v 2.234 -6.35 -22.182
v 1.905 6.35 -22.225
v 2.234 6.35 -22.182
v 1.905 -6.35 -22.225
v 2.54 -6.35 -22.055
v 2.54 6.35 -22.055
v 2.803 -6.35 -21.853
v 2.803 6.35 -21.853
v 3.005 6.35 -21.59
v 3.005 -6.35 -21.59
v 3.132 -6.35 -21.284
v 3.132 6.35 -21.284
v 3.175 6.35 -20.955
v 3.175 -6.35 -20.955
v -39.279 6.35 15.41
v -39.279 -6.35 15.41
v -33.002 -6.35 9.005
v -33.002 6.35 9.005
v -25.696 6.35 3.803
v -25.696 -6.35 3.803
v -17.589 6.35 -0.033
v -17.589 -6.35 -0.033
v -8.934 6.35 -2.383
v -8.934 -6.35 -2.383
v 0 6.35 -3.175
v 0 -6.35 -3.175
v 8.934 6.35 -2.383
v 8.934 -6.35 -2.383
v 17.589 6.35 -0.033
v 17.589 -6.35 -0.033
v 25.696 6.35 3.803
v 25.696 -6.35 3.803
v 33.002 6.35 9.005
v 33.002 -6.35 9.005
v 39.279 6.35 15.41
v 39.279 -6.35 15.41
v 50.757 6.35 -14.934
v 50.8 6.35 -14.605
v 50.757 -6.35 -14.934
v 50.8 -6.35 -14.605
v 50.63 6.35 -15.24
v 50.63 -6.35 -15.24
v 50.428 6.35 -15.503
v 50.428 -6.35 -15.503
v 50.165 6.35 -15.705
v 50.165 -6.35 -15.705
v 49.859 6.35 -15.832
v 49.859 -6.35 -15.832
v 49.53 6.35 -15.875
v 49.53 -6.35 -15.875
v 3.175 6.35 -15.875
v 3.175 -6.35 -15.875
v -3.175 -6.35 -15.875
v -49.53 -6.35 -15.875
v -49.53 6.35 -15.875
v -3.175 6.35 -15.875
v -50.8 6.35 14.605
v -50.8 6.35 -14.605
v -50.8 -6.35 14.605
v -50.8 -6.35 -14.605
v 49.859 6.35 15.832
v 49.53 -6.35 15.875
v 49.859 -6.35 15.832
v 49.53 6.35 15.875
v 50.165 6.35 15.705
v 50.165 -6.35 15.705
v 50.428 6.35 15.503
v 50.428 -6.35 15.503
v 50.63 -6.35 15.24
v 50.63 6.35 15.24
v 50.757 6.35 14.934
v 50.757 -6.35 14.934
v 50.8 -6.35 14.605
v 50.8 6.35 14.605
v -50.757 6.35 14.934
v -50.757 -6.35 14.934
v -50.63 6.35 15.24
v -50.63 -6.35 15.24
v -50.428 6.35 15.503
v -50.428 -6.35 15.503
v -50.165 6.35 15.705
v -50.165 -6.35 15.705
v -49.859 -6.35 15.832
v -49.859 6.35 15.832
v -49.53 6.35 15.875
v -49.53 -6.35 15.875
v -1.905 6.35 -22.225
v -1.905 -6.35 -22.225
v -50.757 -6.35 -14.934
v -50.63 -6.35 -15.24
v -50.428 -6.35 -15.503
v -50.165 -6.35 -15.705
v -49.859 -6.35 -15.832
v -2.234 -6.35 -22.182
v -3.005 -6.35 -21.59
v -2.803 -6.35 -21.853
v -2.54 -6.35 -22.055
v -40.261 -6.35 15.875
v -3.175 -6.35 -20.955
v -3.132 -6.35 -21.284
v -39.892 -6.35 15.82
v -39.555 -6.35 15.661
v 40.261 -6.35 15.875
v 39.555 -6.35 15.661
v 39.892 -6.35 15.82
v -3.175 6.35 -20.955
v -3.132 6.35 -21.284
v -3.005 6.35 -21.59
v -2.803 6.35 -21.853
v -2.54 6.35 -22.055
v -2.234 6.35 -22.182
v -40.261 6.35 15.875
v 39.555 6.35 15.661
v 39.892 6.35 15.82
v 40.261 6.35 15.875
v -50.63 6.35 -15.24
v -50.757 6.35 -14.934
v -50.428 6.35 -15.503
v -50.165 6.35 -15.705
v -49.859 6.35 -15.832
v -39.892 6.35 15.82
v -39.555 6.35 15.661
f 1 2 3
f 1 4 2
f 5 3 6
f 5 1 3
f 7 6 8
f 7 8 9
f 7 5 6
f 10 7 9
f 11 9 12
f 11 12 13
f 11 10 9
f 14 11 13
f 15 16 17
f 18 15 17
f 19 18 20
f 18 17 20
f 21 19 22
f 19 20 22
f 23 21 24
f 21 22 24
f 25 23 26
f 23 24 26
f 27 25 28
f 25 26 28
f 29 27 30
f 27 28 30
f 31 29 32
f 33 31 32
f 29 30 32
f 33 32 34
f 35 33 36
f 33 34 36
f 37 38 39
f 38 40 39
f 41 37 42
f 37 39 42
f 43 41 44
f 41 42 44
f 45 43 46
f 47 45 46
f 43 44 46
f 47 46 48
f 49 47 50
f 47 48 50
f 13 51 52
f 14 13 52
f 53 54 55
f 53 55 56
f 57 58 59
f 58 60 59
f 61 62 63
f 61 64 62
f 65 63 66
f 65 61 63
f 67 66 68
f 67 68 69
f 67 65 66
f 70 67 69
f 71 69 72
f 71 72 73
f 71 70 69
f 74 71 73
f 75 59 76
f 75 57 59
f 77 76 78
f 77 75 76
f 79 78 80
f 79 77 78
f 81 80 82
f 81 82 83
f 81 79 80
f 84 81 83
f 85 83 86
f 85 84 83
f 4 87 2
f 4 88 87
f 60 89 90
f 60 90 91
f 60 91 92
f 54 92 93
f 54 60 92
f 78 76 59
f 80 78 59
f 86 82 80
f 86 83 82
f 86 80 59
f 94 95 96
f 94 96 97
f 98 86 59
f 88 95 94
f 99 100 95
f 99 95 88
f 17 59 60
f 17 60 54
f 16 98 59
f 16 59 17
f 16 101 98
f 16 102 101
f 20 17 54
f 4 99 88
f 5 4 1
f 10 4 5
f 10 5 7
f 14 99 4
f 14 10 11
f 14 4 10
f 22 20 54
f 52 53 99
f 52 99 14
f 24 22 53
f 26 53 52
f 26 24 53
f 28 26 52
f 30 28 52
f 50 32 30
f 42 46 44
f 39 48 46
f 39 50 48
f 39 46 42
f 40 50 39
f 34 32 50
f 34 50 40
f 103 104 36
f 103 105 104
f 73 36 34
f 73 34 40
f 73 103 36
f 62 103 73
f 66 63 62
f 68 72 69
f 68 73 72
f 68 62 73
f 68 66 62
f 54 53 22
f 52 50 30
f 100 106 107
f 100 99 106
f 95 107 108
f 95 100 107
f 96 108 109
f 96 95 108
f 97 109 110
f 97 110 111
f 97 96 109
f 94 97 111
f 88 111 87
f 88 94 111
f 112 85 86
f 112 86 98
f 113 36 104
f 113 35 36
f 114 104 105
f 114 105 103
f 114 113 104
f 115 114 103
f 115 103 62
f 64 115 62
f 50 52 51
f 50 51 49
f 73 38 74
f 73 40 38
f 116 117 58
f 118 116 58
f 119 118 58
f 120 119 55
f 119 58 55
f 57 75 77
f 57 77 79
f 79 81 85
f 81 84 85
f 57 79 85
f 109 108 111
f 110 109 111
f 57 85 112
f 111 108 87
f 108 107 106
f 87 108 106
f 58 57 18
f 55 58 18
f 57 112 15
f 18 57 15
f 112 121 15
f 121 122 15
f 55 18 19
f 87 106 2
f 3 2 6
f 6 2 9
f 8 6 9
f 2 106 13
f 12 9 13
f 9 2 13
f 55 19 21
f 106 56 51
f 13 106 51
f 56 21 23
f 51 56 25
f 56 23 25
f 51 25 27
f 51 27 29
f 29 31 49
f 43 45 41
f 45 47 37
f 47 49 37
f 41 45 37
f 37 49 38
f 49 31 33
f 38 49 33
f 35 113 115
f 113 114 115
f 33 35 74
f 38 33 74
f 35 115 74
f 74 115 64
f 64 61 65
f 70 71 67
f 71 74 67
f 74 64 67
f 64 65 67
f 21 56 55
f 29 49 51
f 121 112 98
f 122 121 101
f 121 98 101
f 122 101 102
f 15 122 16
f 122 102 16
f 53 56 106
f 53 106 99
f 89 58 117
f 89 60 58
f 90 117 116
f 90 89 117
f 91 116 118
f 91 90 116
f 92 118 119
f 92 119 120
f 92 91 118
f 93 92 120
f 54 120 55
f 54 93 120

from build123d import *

# Parameters (mm, degrees)
F0_W     = 101.6
F0_H     = 31.75
F1_DEPTH = 6.35
F3_DEPTH = 12.7
F4_W     = 6.35
F4_H     = 12.7
F5_DEPTH = 6.35
F6_R     = 1.27


with BuildPart() as f1:
    # F0 (on Front) → F1 (new body, symmetric)
    with BuildSketch(Plane.XZ):
        Rectangle(F0_W, F0_H)
    extrude(amount=F1_DEPTH, both=True)

    # F2 (on Front) → F3 (cut, symmetric)
    with BuildSketch(Plane.XZ):
        with BuildLine():
            Line((39.6557372898, 15.875), (-39.6557372898, 15.875))
            ThreePointArc((-39.6557372898, 15.875), (0, -3.175), (39.6557372898, 15.875))
        make_face()
    extrude(amount=F3_DEPTH, both=True, mode=Mode.SUBTRACT)

    # F4 (on face) → F5 (join)
    with BuildSketch(Plane(origin=(0, 0, -15.875), x_dir=(1, 0, 0), z_dir=(0, 0, -1))):
        Rectangle(F4_W, F4_H)
    extrude(amount=F5_DEPTH)

    # F6
    f6_edges = [f1.edges().sort_by_distance(p)[0] for p in [
        (-3.175, 0, -22.225),
        (3.175, 0, -22.225),
        (-50.8, 0, -15.875),
        (-50.8, 0, 15.875),
        (-39.655737, 0, 15.875),
        (39.655737, 0, 15.875),
        (50.8, 0, 15.875),
        (50.8, 0, -15.875),
    ]]
    fillet(f6_edges, radius=F6_R)


solid = f1.part
